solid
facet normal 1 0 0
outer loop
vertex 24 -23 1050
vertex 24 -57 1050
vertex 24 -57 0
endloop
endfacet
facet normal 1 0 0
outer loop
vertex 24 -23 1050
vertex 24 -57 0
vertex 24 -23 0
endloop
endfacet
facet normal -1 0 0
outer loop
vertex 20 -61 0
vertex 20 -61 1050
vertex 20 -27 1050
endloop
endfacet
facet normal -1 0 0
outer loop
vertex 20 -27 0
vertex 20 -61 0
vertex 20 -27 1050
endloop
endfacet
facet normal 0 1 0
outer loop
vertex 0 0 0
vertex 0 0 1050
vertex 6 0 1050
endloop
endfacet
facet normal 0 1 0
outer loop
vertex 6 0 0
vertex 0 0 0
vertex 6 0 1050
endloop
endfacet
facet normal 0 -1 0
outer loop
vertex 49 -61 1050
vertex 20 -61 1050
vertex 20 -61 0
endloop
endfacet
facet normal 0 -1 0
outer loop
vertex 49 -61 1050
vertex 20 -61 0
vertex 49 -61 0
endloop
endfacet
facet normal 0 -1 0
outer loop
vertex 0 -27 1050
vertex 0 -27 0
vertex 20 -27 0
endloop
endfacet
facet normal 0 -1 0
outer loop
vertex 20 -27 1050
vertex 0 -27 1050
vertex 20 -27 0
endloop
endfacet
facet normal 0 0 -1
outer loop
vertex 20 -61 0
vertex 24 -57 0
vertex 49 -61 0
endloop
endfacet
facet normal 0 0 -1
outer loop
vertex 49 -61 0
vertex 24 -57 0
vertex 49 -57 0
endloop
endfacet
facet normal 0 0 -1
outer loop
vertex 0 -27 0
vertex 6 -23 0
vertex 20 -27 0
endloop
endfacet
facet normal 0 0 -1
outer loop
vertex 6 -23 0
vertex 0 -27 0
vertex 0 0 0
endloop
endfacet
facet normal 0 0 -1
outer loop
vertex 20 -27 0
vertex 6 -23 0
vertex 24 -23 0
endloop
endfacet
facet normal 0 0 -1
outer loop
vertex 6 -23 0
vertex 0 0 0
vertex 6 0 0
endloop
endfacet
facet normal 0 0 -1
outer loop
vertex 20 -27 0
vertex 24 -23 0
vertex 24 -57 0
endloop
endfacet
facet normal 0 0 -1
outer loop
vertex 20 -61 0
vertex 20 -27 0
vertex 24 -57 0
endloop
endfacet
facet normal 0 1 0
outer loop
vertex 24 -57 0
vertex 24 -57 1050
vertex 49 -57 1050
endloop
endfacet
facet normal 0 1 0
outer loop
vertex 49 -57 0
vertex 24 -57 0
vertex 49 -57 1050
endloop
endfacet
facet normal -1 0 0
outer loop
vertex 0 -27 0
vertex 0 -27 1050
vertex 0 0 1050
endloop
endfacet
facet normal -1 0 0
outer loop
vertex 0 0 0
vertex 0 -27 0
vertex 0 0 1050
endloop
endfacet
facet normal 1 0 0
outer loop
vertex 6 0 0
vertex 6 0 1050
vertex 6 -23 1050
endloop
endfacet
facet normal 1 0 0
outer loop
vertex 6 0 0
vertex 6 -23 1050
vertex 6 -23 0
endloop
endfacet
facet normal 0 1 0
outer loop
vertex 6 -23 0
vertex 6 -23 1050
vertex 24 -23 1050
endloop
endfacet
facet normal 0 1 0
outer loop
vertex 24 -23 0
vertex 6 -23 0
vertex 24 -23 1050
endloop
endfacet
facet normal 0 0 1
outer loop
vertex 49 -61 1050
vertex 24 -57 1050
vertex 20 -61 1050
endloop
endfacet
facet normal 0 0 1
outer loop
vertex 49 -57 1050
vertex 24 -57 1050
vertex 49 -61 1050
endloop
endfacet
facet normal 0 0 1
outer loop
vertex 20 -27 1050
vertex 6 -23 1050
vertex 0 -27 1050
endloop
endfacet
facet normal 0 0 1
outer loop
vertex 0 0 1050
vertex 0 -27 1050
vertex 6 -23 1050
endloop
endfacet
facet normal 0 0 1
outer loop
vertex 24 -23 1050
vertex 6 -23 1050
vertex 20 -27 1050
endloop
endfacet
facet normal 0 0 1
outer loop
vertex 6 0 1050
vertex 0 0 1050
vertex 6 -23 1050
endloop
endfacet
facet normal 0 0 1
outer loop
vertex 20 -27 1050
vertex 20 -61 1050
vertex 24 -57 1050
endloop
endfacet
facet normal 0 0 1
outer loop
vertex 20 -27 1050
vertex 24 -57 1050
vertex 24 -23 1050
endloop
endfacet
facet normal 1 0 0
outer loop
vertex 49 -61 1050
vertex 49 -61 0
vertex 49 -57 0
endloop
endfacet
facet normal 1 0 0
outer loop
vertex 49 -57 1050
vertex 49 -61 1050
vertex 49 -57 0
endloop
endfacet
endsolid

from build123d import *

# Parameters (mm, degrees)
CROQUIS1_W              = 6
CROQUIS1_H              = 1050
SALIENTE_EXTRUIR1_DEPTH = 23
CROQUIS2_W              = 24
CROQUIS2_H              = 4
SALIENTE_EXTRUIR2_DEPTH = 1050
CROQUIS3_W              = 4
CROQUIS3_H              = 30
SALIENTE_EXTRUIR3_DEPTH = 1050
CROQUIS4_W              = 29
CROQUIS4_H              = 4
SALIENTE_EXTRUIR4_DEPTH = 1050


with BuildPart() as part:
    # Croquis1 → Saliente-Extruir1 (new body)
    with BuildSketch(Plane(origin=(0, 0, 0), x_dir=(1, 0, 0), z_dir=(0, 1, 0))):
        with Locations((3, -525)):
            Rectangle(CROQUIS1_W, CROQUIS1_H)
    extrude(amount=-SALIENTE_EXTRUIR1_DEPTH)

    # Croquis2 → Saliente-Extruir2 (add)
    with BuildSketch(Plane.XY.offset(1050)):
        with Locations((12, -25)):
            Rectangle(CROQUIS2_W, CROQUIS2_H)
    extrude(amount=-SALIENTE_EXTRUIR2_DEPTH)

    # Croquis3 → Saliente-Extruir3 (add)
    with BuildSketch(Plane.XY.offset(1050)):
        with Locations((22, -42)):
            Rectangle(CROQUIS3_W, CROQUIS3_H)
    extrude(amount=-SALIENTE_EXTRUIR3_DEPTH)

    # Croquis4 → Saliente-Extruir4 (add)
    with BuildSketch(Plane.XY.offset(1050)):
        with Locations((34.5, -59)):
            Rectangle(CROQUIS4_W, CROQUIS4_H)
    extrude(amount=-SALIENTE_EXTRUIR4_DEPTH)


solid = part.part
